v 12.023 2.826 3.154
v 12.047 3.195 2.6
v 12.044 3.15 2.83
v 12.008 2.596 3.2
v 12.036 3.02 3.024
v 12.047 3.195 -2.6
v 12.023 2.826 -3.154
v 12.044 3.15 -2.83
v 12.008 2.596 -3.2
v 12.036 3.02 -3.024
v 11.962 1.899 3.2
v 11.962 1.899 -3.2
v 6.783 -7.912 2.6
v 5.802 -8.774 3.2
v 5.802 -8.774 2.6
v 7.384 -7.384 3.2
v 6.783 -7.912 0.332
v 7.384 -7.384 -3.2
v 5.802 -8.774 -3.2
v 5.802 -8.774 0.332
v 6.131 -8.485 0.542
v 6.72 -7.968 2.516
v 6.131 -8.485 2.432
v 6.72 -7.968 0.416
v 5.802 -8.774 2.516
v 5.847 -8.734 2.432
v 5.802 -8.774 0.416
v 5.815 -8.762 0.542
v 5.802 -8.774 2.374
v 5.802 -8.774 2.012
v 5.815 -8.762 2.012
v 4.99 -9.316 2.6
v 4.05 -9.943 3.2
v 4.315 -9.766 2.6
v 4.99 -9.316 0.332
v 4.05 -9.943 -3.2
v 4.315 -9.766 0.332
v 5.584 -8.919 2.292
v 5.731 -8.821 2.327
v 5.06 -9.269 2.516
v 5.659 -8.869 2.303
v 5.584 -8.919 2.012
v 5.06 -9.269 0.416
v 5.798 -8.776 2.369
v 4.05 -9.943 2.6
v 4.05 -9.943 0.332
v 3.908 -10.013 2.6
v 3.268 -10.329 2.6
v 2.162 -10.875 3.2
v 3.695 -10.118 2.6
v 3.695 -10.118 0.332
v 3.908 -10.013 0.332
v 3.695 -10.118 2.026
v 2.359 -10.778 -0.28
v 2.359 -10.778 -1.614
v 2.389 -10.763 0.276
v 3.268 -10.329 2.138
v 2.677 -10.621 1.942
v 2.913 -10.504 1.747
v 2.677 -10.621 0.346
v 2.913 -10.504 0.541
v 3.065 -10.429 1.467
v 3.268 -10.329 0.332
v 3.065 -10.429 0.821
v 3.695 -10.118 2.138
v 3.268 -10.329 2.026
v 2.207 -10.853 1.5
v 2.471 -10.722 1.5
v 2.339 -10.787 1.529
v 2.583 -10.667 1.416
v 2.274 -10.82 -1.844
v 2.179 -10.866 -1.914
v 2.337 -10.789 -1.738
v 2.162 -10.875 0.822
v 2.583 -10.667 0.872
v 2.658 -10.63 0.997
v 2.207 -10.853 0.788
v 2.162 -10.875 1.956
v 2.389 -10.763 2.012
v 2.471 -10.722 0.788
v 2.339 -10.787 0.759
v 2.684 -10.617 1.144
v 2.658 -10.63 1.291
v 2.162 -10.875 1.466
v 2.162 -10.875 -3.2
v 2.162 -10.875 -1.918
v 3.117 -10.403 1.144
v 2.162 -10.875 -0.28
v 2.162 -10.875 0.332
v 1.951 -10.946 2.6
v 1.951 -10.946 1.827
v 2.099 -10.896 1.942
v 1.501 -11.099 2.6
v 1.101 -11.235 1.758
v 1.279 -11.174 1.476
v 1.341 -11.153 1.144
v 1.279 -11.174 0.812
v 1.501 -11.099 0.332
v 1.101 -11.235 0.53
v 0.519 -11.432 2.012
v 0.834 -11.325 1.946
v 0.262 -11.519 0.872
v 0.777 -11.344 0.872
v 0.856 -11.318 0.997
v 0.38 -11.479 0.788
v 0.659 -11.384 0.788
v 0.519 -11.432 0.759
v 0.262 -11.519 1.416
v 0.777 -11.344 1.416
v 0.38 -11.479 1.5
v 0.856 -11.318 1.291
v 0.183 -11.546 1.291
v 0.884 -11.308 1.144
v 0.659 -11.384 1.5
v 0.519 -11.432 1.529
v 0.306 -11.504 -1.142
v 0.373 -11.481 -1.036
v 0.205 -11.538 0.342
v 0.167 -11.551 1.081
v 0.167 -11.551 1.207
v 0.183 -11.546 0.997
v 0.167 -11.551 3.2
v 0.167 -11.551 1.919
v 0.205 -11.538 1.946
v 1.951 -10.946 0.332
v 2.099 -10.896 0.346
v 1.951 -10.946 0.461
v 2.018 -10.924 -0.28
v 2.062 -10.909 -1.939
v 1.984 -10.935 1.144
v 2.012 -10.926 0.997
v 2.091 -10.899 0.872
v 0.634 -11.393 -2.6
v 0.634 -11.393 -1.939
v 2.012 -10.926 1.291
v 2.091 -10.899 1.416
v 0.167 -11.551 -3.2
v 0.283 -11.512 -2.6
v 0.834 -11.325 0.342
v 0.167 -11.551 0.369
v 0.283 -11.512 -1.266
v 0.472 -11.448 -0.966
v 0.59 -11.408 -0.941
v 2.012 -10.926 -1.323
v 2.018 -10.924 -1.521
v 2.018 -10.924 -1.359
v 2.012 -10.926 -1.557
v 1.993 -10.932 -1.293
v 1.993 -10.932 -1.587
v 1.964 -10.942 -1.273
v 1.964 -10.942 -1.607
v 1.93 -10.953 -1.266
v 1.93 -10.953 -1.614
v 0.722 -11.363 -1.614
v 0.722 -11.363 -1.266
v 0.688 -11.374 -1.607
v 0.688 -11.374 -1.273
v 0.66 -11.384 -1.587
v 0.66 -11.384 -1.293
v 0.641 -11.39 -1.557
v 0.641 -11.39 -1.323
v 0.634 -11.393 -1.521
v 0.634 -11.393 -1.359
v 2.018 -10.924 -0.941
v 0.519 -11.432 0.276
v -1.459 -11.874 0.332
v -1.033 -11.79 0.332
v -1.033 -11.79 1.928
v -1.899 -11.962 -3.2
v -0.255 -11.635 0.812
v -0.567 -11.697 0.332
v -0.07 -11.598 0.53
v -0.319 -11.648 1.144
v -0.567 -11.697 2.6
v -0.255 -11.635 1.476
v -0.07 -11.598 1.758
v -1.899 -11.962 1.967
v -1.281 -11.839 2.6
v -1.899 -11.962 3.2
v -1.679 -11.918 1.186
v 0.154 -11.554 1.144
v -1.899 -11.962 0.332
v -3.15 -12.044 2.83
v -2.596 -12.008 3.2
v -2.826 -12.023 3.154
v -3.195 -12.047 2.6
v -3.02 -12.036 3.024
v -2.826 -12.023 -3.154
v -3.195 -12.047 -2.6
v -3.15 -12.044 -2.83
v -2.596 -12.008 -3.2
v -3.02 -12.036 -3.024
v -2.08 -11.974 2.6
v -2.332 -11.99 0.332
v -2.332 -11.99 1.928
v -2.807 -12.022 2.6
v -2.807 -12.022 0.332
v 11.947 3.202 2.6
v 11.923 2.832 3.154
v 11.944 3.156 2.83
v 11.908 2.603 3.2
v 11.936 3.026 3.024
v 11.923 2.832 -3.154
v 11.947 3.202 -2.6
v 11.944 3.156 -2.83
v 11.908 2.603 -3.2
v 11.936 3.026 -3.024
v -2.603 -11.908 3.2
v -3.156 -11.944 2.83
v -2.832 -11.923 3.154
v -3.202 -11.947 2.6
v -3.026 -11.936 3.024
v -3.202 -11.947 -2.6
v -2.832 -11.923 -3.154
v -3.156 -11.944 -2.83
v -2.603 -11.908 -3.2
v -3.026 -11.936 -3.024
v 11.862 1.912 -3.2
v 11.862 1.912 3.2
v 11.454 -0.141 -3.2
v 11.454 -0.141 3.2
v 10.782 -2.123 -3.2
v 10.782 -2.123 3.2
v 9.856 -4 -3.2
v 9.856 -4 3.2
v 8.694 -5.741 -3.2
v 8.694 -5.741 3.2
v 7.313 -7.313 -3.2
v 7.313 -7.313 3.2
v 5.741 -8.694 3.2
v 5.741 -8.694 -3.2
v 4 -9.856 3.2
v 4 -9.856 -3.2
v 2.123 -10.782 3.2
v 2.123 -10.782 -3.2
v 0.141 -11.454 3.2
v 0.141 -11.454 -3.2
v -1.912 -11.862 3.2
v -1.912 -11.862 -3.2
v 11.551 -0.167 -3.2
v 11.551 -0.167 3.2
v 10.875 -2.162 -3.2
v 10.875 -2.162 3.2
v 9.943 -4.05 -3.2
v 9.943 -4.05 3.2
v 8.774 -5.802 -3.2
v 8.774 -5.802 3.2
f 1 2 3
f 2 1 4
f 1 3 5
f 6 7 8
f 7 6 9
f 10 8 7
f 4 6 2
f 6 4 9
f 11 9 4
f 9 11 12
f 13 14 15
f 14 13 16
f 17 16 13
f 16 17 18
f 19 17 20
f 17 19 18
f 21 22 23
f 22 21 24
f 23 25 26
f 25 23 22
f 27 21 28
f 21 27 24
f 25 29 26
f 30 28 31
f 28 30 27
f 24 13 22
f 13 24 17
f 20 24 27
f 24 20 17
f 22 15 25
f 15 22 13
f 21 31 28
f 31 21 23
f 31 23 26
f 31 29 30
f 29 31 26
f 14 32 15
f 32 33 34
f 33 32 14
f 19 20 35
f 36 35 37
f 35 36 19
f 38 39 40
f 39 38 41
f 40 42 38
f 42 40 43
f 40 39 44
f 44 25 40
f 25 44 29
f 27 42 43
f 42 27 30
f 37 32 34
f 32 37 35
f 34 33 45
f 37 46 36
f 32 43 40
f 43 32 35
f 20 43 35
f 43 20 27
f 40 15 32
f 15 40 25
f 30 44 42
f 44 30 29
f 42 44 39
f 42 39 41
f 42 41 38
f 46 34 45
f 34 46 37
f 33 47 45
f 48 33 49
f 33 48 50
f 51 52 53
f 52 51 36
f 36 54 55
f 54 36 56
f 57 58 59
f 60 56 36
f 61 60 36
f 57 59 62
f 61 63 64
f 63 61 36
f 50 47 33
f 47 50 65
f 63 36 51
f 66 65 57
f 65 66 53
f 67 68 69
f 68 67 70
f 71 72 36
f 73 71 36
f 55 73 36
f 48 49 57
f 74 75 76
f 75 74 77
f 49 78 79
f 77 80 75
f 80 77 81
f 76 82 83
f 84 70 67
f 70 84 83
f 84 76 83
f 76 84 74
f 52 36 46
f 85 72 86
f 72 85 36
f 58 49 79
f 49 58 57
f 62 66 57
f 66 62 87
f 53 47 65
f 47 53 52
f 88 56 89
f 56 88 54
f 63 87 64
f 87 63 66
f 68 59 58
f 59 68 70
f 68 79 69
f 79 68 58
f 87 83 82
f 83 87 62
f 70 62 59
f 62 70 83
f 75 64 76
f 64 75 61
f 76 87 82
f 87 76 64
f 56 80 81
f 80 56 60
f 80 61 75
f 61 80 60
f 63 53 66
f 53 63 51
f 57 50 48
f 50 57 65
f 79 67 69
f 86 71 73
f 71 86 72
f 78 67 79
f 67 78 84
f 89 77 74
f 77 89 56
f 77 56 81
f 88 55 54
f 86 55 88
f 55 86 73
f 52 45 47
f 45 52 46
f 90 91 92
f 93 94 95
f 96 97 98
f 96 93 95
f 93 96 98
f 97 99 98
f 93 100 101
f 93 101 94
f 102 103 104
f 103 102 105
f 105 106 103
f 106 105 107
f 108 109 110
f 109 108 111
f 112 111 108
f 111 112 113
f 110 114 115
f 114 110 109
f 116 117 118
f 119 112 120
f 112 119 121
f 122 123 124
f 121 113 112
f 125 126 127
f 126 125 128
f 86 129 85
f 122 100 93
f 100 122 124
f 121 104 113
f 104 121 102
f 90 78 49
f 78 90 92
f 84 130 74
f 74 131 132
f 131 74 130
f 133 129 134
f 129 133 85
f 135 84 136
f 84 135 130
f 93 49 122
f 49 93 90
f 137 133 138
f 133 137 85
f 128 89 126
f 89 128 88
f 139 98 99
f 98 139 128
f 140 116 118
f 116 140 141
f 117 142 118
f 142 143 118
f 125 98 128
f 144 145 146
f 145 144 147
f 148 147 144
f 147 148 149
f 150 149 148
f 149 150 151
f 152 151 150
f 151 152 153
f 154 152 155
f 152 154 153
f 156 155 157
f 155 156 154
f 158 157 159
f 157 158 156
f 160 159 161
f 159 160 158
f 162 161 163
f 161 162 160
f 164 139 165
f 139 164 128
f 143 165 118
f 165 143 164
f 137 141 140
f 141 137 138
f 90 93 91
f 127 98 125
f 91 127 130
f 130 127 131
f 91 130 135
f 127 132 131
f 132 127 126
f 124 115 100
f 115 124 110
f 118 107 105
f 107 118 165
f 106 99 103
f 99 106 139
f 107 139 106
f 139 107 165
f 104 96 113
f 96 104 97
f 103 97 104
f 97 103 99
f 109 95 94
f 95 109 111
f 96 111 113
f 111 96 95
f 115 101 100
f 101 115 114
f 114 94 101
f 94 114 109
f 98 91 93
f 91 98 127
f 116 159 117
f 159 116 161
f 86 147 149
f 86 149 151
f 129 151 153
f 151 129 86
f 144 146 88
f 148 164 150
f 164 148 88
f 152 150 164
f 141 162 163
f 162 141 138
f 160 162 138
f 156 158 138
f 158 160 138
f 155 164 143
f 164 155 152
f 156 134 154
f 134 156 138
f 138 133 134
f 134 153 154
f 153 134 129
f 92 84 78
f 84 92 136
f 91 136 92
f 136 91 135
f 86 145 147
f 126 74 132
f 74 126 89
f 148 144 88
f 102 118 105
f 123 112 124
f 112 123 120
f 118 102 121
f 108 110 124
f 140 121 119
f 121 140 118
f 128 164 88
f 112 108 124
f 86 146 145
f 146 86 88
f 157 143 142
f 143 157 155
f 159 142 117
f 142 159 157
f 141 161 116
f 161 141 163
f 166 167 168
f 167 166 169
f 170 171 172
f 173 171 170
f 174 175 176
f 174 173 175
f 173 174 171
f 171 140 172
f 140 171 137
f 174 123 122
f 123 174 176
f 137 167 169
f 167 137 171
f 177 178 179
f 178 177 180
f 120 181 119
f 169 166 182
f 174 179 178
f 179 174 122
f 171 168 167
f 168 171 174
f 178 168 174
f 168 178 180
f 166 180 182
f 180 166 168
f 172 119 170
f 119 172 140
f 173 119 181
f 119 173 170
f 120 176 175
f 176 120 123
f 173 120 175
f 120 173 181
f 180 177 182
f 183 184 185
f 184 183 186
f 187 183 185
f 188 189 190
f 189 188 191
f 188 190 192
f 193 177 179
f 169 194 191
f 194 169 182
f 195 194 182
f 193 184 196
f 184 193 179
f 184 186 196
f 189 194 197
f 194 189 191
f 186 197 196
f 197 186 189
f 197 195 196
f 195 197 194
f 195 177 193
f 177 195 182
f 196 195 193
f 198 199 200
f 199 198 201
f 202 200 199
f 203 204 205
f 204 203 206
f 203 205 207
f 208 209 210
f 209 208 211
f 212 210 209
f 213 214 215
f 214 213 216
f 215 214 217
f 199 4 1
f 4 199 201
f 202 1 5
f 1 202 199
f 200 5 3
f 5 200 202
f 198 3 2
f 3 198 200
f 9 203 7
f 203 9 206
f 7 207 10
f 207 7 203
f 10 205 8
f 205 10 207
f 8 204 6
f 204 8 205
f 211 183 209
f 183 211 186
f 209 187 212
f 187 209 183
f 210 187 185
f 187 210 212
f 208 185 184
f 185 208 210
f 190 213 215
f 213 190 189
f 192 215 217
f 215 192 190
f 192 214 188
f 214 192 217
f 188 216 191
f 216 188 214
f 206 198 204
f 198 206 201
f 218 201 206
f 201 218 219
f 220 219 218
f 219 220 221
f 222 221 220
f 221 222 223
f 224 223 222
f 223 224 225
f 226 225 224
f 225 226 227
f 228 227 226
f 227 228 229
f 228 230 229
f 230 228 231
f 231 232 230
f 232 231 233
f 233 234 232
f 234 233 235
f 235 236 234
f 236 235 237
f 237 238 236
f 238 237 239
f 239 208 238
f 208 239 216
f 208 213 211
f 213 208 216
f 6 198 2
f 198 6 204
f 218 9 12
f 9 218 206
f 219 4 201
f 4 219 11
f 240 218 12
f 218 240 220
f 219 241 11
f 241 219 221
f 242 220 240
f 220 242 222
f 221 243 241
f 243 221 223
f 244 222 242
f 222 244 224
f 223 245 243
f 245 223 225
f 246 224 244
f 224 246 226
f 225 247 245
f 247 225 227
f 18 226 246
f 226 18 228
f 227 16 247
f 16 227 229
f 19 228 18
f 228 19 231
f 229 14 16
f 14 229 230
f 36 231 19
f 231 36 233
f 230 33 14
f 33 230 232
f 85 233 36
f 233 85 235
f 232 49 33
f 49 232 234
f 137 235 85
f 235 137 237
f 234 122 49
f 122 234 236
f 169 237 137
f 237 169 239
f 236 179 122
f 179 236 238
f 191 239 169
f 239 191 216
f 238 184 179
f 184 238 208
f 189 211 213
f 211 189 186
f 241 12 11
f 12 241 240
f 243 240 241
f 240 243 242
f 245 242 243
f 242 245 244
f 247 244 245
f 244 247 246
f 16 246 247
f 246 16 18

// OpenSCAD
use <../lib.scad>
use <s/6221655ks01.scad>
use <s/6221655ks02.scad>
use <s/6221655ks03.scad>
use <s/6221655ks04.scad>
use <s/6221655ks05.scad>
use <s/6221655ks06.scad>
use <s/6221655ks07.scad>
use <s/6221655ks09.scad>
function ldraw_lib__6221655kc01() = [
// 0 Sticker  0.8 x  3.0 with White Mobil1 Logo on Black Background Right (Formed)
// 0 Name: 6221655kc01.dat
// 0 Author: Massimo Maso [Sirio]
// 0 !LDRAW_ORG Part UPDATE 2025-03
// 0 !LICENSE Licensed under CC BY 4.0 : see CAreadme.txt
// 
// 0 BFC CERTIFY CCW
  [0,"BFC","CERTIFY"],
  [0,"BFC","CCW"],
// 
// 0 !KEYWORDS 3.0, 911 RSR, Porsche, Set 75888, Speed Champions, Turbo
// 
// 0 !HISTORY 2025-03-30 [OrionP] Official Update 2025-03
// 
// 1 16 29.656 0 4.78 0 -.997836 .065758 1 0 0 0 .065758 .997836 s\6221655ks01.dat
  [1,16,29.656,0,4.78,0,-.997836,.065758,1,0,0,0,.065758,.997836, ldraw_lib__s__6221655ks01()],
// 1 16 14.352 0 -21.736 0 -.659749 .751486 1 0 0 0 .751486 .659749 s\6221655ks02.dat
  [1,16,14.352,0,-21.736,0,-.659749,.751486,1,0,0,0,.751486,.659749, ldraw_lib__s__6221655ks02()],
// 1 16 14.352 0 -21.736 0 -.555054 .831815 1 0 0 0 .831815 .555054 s\6221655ks03.dat
  [1,16,14.352,0,-21.736,0,-.555054,.831815,1,0,0,0,.831815,.555054, ldraw_lib__s__6221655ks03()],
// 1 16 5.308 0 -26.956 0 -.442621 .896709 1 0 0 0 .896709 .442621 s\6221655ks04.dat
  [1,16,5.308,0,-26.956,0,-.442621,.896709,1,0,0,0,.896709,.442621, ldraw_lib__s__6221655ks04()],
// 1 16 5.308 0 -26.956 0 -.321039 .947066 1 0 0 0 .947066 .321039 s\6221655ks05.dat
  [1,16,5.308,0,-26.956,0,-.321039,.947066,1,0,0,0,.947066,.321039, ldraw_lib__s__6221655ks05()],
// 1 16 -4.78 0 -29.656 0 -.19494 .980815 1 0 0 0 .980815 .19494 s\6221655ks06.dat
  [1,16,-4.78,0,-29.656,0,-.19494,.980815,1,0,0,0,.980815,.19494, ldraw_lib__s__6221655ks06()],
// 1 16 -4.78 0 -29.656 0 -.065758 .997836 1 0 0 0 .997836 .065758 s\6221655ks07.dat
  [1,16,-4.78,0,-29.656,0,-.065758,.997836,1,0,0,0,.997836,.065758, ldraw_lib__s__6221655ks07()],
// 1 16 0 0 0 1 0 0 0 1 0 0 0 1 s\6221655ks09.dat
  [1,16,0,0,0,1,0,0,0,1,0,0,0,1, ldraw_lib__s__6221655ks09()],
// 0 // Complementary faces
// 4 0 28.878 -8 -.4168 28.878 8 -.4168 29.9044 8 4.7473 29.9044 -8 4.7473
  [4,0,28.878,-8,-.4168,28.878,8,-.4168,29.9044,8,4.7473,29.9044,-8,4.7473],
// 4 0 28.878 -8 -.4168 27.1875 -8 -5.4039 27.1875 8 -5.4039 28.878 8 -.4168
  [4,0,28.878,-8,-.4168,27.1875,-8,-5.4039,27.1875,8,-5.4039,28.878,8,-.4168],
// 4 0 24.857 -8 -10.1252 24.857 8 -10.1252 27.1875 8 -5.4039 27.1875 -8 -5.4039
  [4,0,24.857,-8,-10.1252,24.857,8,-10.1252,27.1875,8,-5.4039,27.1875,-8,-5.4039],
// 4 0 24.857 -8 -10.1252 21.9348 -8 -14.5045 21.9348 8 -14.5045 24.857 8 -10.1252
  [4,0,24.857,-8,-10.1252,21.9348,-8,-14.5045,21.9348,8,-14.5045,24.857,8,-10.1252],
// 4 0 18.4611 -8 -18.4611 18.4611 8 -18.4611 21.9348 8 -14.5045 21.9348 -8 -14.5045
  [4,0,18.4611,-8,-18.4611,18.4611,8,-18.4611,21.9348,8,-14.5045,21.9348,-8,-14.5045],
];
module ldraw_lib__6221655kc01(step=0, col=false, unit=2/5, alt=false, line=0.2, solid=!$preview)
    makepoly(ldraw_lib__6221655kc01(), step=step, col=col, unit=unit, alt=alt, line=line, solid=solid);
ldraw_lib__6221655kc01(line=0.2);
